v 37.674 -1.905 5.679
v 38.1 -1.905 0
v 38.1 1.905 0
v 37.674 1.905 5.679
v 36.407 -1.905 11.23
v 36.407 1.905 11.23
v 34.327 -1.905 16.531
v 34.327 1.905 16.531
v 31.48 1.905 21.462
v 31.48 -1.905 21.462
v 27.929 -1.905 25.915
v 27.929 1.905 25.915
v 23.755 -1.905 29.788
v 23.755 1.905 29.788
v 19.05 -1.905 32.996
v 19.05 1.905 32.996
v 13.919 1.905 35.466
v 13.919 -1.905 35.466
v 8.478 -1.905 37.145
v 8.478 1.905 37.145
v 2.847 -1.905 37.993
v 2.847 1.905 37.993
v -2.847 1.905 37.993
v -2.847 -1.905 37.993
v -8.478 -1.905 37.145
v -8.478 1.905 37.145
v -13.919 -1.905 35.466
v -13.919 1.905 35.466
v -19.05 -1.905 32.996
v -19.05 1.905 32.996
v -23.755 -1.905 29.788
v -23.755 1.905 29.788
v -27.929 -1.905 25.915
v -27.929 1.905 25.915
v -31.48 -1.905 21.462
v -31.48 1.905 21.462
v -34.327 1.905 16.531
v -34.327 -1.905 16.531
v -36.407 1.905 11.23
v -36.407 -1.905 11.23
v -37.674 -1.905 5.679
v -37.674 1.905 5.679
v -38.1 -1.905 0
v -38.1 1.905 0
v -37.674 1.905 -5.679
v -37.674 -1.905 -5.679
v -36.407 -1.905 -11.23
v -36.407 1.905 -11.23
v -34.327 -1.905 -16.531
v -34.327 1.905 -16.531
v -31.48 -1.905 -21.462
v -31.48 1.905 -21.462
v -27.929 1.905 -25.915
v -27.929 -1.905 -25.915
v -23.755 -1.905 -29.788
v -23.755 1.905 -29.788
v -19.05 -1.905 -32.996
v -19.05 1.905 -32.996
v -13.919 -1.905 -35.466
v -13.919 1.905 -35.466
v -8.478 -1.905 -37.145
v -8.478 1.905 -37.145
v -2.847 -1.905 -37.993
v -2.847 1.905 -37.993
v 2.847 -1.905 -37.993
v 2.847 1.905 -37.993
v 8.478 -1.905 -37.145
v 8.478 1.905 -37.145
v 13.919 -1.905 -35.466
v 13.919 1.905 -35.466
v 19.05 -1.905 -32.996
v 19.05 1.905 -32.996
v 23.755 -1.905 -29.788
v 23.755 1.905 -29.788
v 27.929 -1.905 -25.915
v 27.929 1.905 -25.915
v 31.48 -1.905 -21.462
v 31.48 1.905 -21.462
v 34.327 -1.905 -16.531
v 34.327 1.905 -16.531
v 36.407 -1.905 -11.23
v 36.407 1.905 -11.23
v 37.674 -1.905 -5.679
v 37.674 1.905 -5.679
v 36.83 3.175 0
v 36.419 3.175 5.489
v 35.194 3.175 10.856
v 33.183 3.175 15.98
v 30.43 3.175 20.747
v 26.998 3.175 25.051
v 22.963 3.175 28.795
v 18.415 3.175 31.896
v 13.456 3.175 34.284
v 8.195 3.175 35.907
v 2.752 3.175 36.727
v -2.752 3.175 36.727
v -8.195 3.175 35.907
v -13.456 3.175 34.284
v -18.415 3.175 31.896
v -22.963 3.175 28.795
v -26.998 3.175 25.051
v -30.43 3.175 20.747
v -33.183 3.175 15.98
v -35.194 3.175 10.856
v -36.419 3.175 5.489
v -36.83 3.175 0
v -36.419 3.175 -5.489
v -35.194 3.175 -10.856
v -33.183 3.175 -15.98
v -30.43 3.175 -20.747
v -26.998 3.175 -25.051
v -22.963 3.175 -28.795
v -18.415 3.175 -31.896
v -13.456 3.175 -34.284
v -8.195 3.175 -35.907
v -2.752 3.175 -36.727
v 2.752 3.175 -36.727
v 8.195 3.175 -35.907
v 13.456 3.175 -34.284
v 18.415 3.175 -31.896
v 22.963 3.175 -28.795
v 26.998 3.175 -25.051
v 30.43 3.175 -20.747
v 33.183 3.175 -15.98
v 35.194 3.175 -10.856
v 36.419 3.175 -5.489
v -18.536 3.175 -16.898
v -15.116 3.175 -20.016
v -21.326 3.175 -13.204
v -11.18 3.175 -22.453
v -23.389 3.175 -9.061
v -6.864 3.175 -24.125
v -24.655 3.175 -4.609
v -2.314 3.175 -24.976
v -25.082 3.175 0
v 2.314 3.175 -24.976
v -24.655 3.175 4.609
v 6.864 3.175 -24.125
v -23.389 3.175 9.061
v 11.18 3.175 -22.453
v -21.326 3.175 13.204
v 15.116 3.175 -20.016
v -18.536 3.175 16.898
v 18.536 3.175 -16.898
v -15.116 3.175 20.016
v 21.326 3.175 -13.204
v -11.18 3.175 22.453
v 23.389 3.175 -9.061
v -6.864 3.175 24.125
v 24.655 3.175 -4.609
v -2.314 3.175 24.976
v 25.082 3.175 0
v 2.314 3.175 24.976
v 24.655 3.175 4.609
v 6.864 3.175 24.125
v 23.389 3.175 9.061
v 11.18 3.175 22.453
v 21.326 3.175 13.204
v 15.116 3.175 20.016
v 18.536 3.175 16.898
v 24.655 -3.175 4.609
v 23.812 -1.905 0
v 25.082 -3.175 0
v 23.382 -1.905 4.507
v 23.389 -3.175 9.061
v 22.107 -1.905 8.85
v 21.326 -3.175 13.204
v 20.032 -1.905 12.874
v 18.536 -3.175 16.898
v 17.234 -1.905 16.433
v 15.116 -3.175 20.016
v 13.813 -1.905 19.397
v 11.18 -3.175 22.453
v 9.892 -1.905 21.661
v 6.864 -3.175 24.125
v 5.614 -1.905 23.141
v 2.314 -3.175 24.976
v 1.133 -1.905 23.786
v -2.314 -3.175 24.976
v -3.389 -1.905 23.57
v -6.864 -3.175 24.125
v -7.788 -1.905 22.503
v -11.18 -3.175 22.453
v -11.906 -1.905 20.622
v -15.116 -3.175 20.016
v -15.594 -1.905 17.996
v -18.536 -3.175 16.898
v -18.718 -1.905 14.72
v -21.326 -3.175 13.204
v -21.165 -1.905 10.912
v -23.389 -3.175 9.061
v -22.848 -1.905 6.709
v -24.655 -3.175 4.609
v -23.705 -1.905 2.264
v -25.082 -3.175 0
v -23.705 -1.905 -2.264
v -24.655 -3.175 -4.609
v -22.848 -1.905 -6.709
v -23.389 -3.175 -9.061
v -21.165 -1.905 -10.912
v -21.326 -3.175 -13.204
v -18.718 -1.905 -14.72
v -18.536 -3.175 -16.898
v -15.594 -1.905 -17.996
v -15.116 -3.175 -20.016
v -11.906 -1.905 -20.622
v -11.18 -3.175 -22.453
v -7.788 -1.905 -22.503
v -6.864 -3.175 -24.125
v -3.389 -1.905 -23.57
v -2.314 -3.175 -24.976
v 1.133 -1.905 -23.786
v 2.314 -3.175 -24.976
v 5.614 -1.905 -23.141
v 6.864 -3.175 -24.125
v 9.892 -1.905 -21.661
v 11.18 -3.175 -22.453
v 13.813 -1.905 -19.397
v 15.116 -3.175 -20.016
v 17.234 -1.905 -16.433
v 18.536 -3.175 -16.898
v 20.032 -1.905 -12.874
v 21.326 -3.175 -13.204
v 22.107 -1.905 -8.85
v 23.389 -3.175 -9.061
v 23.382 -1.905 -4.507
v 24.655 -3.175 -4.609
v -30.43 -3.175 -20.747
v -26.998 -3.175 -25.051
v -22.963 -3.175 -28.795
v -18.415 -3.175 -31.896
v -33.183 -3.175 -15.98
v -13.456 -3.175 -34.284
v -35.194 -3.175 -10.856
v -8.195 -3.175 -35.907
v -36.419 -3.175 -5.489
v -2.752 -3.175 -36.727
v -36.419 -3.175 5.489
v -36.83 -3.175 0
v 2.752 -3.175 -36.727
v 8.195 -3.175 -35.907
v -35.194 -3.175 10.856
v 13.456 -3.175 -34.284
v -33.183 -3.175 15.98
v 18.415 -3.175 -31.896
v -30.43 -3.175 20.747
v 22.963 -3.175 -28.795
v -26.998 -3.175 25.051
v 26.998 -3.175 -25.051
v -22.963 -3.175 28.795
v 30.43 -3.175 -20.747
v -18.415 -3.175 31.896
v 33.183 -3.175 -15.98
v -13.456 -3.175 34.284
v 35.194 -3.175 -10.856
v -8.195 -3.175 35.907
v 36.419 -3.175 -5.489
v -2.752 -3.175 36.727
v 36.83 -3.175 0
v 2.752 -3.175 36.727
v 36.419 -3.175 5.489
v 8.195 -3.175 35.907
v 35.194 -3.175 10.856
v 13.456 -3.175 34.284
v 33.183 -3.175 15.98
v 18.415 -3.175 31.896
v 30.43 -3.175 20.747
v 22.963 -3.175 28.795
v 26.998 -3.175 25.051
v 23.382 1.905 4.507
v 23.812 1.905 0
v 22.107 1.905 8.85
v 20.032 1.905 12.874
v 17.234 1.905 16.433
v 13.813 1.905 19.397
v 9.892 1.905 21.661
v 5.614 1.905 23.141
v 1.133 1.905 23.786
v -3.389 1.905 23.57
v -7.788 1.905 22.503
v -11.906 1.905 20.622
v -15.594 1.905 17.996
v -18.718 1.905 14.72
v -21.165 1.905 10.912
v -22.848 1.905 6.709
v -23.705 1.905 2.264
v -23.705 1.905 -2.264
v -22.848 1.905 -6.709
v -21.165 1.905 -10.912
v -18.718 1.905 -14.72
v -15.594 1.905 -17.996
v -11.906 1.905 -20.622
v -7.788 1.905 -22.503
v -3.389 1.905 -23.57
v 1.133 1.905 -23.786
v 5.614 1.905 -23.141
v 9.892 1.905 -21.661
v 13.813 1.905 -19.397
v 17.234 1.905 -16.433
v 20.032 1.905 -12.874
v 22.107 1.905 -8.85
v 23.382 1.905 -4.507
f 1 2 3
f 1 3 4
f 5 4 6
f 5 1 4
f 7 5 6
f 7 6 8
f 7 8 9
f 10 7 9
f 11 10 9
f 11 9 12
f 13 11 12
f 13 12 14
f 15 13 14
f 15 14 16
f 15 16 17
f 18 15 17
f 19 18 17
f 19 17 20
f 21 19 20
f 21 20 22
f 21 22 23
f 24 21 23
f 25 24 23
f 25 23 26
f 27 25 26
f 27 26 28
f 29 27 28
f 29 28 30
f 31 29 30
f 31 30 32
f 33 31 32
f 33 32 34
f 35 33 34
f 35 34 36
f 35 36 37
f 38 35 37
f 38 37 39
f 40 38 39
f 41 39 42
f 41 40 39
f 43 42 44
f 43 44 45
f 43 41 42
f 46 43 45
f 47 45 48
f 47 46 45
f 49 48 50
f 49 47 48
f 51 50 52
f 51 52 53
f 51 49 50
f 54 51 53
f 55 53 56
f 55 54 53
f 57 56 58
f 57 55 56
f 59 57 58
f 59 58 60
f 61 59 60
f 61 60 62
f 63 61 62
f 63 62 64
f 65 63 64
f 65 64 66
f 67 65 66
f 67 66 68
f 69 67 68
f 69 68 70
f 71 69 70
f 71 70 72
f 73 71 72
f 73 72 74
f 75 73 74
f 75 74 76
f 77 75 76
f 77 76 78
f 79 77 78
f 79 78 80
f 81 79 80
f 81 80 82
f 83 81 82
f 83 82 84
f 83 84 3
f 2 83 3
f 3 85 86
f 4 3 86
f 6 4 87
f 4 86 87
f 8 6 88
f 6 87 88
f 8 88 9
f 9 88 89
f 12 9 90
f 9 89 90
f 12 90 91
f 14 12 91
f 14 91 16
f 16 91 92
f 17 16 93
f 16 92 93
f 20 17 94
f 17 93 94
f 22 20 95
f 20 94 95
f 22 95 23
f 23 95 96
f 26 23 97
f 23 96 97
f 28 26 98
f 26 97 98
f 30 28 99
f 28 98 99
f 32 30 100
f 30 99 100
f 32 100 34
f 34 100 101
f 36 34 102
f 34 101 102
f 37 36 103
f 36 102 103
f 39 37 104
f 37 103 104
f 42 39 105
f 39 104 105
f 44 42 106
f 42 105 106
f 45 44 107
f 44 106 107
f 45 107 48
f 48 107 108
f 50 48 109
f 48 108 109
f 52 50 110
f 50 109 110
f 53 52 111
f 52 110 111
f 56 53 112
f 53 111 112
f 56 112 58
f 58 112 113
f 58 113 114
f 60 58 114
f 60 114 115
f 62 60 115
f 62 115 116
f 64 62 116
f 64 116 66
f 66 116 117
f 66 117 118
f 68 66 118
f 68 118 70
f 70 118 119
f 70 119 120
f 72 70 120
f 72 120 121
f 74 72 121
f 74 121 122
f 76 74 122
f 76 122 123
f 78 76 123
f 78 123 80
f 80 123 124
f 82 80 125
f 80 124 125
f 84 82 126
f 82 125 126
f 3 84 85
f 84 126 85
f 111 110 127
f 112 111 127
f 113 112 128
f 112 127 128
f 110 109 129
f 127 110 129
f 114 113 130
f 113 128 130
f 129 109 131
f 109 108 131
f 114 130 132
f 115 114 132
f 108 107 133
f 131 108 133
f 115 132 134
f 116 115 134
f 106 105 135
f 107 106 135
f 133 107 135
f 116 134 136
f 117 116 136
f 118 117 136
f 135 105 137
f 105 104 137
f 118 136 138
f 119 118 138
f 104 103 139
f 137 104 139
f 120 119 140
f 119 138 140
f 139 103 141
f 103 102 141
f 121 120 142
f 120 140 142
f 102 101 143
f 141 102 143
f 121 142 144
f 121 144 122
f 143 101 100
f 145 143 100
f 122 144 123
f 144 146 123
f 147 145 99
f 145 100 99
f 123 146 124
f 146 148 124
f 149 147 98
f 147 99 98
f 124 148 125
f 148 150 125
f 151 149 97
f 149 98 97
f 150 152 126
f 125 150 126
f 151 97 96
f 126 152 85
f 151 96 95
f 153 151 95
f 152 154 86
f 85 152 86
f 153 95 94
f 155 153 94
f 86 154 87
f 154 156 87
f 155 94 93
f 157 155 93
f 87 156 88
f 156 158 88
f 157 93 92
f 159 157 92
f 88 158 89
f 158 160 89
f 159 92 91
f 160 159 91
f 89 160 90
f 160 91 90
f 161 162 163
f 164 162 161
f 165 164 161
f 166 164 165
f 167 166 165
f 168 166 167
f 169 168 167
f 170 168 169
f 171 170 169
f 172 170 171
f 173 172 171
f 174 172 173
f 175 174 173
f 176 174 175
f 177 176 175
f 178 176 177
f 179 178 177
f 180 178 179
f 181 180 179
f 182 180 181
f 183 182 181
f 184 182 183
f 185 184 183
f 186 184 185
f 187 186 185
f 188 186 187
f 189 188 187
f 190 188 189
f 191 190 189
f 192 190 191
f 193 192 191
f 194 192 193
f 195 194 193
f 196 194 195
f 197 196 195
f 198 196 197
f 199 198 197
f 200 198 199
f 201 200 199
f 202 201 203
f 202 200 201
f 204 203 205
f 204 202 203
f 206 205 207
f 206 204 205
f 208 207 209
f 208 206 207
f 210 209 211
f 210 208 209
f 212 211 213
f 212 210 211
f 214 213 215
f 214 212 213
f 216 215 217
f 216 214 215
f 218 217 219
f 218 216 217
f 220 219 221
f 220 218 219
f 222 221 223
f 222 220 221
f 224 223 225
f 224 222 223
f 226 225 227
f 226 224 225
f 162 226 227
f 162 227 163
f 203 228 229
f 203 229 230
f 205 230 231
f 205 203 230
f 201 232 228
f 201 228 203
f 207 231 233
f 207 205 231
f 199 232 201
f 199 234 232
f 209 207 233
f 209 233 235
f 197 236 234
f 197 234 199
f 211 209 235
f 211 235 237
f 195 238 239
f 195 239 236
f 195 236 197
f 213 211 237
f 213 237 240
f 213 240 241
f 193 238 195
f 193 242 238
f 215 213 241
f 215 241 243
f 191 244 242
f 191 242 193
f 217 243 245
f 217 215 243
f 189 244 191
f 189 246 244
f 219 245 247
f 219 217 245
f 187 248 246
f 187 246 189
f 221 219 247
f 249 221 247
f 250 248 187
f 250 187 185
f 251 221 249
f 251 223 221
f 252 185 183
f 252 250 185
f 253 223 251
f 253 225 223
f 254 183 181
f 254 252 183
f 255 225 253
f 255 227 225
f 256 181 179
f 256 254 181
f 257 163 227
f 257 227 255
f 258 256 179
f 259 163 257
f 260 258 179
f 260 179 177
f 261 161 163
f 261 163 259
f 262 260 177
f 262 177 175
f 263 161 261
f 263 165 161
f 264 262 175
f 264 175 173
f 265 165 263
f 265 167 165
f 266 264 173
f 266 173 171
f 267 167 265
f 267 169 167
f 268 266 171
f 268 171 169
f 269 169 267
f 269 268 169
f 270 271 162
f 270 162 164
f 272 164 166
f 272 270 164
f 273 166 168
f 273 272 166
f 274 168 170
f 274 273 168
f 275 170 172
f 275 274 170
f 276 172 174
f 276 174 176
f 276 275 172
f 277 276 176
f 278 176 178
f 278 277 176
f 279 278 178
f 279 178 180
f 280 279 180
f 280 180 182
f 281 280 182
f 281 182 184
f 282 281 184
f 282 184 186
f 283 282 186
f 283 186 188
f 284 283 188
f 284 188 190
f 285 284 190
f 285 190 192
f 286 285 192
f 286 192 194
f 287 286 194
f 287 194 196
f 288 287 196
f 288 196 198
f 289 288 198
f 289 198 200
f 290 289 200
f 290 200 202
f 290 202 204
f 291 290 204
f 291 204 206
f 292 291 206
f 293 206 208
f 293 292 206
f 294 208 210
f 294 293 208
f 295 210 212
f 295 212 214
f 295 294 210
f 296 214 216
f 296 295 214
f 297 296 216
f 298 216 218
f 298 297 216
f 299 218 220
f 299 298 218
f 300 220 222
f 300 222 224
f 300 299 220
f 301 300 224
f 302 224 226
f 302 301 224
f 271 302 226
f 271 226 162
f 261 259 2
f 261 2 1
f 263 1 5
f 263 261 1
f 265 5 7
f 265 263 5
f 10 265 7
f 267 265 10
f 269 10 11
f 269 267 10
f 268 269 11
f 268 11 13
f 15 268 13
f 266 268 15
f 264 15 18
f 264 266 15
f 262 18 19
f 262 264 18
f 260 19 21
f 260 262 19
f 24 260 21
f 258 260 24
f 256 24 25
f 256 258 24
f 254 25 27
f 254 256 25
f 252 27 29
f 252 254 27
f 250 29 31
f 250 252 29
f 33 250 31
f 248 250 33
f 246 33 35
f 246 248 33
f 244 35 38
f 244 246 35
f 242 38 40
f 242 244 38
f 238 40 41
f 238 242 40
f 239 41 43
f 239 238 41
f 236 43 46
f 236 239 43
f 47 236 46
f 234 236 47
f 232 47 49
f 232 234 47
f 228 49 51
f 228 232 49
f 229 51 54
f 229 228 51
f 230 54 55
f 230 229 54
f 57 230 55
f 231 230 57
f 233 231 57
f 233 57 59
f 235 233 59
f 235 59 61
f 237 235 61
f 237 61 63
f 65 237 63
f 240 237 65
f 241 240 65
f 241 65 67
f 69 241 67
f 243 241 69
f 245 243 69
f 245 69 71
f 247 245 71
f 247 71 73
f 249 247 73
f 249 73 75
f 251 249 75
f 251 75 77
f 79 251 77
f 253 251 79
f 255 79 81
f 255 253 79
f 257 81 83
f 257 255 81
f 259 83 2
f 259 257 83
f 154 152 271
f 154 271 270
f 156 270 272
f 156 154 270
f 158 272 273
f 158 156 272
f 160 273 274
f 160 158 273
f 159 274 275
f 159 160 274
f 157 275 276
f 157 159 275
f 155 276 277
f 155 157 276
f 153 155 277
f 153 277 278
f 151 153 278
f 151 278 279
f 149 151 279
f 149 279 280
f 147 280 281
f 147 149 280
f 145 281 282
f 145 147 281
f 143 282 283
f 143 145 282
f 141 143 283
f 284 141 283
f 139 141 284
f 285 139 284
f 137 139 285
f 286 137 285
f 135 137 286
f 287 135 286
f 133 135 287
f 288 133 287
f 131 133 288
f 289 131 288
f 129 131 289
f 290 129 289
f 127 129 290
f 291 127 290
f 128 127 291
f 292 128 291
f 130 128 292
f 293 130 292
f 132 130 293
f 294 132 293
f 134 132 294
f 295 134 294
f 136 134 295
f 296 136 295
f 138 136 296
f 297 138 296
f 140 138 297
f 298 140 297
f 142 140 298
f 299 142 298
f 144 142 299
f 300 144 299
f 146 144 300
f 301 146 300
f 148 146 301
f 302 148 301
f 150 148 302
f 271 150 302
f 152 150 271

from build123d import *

# Parameters (mm, degrees)
F0_R     = 38.1
F0_R_2   = 23.8125
F1_DEPTH = 3.175
F2_SIZE  = 1.27


with BuildPart() as f1:
    # F0 (on Front) → F1 (new body, symmetric)
    with BuildSketch(Plane.XZ):
        Circle(F0_R)
        Circle(F0_R_2, mode=Mode.SUBTRACT)
    extrude(amount=F1_DEPTH, both=True)

    # F2
    f2_edges = [f1.edges().sort_by_distance(p)[0] for p in [
        (-38.1, 3.175, 0),
        (38.1, 0, 0),
        (-38.1, -3.175, 0),
        (-23.8125, -3.175, 0),
        (23.8125, 0, 0),
        (-23.8125, 3.175, 0),
    ]]
    chamfer(f2_edges, length=F2_SIZE)


solid = f1.part
